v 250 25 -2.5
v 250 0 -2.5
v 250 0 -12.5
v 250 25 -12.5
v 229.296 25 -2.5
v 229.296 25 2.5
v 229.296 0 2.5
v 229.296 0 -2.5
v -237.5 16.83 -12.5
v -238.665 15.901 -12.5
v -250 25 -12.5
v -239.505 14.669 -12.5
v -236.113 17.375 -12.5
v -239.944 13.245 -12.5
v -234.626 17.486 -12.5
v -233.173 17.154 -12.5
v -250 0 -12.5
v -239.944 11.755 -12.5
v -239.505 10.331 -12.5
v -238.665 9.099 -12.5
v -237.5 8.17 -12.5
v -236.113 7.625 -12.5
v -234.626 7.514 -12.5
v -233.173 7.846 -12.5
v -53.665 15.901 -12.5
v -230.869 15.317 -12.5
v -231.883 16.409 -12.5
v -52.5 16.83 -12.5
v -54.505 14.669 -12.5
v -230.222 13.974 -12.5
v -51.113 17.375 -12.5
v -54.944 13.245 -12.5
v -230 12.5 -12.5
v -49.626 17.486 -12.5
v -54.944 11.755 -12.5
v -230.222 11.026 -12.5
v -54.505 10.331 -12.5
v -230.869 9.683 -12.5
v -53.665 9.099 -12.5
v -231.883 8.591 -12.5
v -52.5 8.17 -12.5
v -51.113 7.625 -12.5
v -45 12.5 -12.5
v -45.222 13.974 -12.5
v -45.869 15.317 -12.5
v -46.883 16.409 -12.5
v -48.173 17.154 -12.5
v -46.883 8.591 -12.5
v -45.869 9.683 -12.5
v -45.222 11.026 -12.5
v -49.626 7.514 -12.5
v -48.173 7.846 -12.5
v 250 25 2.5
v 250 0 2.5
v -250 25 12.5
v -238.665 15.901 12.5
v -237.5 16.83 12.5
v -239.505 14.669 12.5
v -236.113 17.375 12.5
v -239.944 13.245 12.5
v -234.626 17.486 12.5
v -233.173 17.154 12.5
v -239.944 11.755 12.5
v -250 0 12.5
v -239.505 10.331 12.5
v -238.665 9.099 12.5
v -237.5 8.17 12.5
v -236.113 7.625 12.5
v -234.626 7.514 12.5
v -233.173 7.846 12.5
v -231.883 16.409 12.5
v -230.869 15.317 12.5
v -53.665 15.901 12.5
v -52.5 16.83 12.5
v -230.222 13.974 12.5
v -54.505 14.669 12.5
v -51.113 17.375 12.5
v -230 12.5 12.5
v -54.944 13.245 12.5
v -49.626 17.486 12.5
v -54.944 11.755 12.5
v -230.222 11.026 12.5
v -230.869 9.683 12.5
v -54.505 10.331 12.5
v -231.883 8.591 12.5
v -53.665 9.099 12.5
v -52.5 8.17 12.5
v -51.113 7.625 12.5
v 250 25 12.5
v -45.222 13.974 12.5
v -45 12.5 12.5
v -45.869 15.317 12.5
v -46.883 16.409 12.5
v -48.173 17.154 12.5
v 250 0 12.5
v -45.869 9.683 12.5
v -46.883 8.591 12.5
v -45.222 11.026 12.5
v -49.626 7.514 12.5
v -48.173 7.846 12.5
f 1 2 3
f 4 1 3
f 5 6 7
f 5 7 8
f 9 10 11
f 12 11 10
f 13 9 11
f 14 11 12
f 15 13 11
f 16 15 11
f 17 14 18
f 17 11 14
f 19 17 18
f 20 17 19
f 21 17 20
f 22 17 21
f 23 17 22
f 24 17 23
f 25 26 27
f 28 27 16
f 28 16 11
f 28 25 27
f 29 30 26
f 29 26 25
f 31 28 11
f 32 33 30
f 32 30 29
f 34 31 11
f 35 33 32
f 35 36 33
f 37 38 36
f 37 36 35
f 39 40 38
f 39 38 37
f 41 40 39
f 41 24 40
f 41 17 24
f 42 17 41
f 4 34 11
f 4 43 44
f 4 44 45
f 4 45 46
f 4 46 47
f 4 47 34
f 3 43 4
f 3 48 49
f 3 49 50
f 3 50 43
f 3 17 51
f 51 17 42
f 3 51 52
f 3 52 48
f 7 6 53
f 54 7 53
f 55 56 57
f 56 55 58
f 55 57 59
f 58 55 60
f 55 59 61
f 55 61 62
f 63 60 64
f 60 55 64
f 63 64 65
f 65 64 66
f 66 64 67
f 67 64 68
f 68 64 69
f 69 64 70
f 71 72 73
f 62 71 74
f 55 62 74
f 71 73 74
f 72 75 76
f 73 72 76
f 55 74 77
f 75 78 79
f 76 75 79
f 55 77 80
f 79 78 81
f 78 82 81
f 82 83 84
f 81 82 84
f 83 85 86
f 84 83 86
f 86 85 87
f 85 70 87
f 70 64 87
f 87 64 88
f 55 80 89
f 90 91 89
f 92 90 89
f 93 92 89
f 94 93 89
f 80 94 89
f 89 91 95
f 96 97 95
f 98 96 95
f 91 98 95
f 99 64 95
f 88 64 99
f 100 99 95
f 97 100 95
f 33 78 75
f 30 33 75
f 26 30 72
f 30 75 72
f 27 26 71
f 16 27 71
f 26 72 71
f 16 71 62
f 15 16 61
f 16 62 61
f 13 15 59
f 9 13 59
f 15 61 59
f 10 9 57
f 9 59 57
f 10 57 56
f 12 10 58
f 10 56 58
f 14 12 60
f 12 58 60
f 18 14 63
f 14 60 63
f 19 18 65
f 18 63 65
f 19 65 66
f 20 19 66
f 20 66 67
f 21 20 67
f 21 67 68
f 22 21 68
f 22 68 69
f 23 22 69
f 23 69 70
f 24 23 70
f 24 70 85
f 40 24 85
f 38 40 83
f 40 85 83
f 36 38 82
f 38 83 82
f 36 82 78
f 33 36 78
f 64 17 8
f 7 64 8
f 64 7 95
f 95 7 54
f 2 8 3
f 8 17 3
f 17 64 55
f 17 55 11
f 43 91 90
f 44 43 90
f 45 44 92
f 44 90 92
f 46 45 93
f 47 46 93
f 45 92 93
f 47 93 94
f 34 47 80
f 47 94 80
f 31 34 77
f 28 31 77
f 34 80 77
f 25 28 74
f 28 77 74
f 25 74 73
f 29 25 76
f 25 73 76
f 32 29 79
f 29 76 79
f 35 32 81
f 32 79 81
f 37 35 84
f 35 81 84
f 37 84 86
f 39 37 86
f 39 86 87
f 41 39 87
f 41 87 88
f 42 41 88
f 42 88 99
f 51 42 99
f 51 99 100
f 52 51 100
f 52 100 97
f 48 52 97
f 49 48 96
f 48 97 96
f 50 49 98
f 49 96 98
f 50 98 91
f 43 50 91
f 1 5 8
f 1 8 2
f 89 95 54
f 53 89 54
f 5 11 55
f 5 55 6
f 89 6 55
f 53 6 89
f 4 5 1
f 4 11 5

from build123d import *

# Parameters (mm, degrees)
SKETCH1_W           = 500
SKETCH1_H           = 25
BOSS_EXTRUDE1_DEPTH = 25
SKETCH2_R           = 5
CUT_EXTRUDE1_DEPTH  = 25
SKETCH5_W           = 20.75
SKETCH5_H           = 5
CUT_EXTRUDE2_DEPTH  = 25


with BuildPart() as part:
    # Sketch1 → Boss-Extrude1 (new body)
    with BuildSketch(Plane(origin=(0, 0, 0), x_dir=(1, 0, 0), z_dir=(0, 1, 0))):
        Rectangle(SKETCH1_W, SKETCH1_H)
    extrude(amount=BOSS_EXTRUDE1_DEPTH)

    # Sketch2 → Cut-Extrude1 (cut)
    with BuildSketch(Plane.XY.offset(12.5)):
        with Locations((-235, 12.5)):
            Circle(SKETCH2_R)
        with Locations((-50, 12.5)):
            Circle(SKETCH2_R)
    extrude(amount=-CUT_EXTRUDE1_DEPTH, mode=Mode.SUBTRACT)

    # Sketch5 → Cut-Extrude2 (cut)
    with BuildSketch(Plane(origin=(0, 25, 0), x_dir=(1, 0, 0), z_dir=(0, 1, 0))):
        with Locations((239.670802425, 0)):
            Rectangle(SKETCH5_W, SKETCH5_H)
    extrude(amount=-CUT_EXTRUDE2_DEPTH, mode=Mode.SUBTRACT)


solid = part.part
